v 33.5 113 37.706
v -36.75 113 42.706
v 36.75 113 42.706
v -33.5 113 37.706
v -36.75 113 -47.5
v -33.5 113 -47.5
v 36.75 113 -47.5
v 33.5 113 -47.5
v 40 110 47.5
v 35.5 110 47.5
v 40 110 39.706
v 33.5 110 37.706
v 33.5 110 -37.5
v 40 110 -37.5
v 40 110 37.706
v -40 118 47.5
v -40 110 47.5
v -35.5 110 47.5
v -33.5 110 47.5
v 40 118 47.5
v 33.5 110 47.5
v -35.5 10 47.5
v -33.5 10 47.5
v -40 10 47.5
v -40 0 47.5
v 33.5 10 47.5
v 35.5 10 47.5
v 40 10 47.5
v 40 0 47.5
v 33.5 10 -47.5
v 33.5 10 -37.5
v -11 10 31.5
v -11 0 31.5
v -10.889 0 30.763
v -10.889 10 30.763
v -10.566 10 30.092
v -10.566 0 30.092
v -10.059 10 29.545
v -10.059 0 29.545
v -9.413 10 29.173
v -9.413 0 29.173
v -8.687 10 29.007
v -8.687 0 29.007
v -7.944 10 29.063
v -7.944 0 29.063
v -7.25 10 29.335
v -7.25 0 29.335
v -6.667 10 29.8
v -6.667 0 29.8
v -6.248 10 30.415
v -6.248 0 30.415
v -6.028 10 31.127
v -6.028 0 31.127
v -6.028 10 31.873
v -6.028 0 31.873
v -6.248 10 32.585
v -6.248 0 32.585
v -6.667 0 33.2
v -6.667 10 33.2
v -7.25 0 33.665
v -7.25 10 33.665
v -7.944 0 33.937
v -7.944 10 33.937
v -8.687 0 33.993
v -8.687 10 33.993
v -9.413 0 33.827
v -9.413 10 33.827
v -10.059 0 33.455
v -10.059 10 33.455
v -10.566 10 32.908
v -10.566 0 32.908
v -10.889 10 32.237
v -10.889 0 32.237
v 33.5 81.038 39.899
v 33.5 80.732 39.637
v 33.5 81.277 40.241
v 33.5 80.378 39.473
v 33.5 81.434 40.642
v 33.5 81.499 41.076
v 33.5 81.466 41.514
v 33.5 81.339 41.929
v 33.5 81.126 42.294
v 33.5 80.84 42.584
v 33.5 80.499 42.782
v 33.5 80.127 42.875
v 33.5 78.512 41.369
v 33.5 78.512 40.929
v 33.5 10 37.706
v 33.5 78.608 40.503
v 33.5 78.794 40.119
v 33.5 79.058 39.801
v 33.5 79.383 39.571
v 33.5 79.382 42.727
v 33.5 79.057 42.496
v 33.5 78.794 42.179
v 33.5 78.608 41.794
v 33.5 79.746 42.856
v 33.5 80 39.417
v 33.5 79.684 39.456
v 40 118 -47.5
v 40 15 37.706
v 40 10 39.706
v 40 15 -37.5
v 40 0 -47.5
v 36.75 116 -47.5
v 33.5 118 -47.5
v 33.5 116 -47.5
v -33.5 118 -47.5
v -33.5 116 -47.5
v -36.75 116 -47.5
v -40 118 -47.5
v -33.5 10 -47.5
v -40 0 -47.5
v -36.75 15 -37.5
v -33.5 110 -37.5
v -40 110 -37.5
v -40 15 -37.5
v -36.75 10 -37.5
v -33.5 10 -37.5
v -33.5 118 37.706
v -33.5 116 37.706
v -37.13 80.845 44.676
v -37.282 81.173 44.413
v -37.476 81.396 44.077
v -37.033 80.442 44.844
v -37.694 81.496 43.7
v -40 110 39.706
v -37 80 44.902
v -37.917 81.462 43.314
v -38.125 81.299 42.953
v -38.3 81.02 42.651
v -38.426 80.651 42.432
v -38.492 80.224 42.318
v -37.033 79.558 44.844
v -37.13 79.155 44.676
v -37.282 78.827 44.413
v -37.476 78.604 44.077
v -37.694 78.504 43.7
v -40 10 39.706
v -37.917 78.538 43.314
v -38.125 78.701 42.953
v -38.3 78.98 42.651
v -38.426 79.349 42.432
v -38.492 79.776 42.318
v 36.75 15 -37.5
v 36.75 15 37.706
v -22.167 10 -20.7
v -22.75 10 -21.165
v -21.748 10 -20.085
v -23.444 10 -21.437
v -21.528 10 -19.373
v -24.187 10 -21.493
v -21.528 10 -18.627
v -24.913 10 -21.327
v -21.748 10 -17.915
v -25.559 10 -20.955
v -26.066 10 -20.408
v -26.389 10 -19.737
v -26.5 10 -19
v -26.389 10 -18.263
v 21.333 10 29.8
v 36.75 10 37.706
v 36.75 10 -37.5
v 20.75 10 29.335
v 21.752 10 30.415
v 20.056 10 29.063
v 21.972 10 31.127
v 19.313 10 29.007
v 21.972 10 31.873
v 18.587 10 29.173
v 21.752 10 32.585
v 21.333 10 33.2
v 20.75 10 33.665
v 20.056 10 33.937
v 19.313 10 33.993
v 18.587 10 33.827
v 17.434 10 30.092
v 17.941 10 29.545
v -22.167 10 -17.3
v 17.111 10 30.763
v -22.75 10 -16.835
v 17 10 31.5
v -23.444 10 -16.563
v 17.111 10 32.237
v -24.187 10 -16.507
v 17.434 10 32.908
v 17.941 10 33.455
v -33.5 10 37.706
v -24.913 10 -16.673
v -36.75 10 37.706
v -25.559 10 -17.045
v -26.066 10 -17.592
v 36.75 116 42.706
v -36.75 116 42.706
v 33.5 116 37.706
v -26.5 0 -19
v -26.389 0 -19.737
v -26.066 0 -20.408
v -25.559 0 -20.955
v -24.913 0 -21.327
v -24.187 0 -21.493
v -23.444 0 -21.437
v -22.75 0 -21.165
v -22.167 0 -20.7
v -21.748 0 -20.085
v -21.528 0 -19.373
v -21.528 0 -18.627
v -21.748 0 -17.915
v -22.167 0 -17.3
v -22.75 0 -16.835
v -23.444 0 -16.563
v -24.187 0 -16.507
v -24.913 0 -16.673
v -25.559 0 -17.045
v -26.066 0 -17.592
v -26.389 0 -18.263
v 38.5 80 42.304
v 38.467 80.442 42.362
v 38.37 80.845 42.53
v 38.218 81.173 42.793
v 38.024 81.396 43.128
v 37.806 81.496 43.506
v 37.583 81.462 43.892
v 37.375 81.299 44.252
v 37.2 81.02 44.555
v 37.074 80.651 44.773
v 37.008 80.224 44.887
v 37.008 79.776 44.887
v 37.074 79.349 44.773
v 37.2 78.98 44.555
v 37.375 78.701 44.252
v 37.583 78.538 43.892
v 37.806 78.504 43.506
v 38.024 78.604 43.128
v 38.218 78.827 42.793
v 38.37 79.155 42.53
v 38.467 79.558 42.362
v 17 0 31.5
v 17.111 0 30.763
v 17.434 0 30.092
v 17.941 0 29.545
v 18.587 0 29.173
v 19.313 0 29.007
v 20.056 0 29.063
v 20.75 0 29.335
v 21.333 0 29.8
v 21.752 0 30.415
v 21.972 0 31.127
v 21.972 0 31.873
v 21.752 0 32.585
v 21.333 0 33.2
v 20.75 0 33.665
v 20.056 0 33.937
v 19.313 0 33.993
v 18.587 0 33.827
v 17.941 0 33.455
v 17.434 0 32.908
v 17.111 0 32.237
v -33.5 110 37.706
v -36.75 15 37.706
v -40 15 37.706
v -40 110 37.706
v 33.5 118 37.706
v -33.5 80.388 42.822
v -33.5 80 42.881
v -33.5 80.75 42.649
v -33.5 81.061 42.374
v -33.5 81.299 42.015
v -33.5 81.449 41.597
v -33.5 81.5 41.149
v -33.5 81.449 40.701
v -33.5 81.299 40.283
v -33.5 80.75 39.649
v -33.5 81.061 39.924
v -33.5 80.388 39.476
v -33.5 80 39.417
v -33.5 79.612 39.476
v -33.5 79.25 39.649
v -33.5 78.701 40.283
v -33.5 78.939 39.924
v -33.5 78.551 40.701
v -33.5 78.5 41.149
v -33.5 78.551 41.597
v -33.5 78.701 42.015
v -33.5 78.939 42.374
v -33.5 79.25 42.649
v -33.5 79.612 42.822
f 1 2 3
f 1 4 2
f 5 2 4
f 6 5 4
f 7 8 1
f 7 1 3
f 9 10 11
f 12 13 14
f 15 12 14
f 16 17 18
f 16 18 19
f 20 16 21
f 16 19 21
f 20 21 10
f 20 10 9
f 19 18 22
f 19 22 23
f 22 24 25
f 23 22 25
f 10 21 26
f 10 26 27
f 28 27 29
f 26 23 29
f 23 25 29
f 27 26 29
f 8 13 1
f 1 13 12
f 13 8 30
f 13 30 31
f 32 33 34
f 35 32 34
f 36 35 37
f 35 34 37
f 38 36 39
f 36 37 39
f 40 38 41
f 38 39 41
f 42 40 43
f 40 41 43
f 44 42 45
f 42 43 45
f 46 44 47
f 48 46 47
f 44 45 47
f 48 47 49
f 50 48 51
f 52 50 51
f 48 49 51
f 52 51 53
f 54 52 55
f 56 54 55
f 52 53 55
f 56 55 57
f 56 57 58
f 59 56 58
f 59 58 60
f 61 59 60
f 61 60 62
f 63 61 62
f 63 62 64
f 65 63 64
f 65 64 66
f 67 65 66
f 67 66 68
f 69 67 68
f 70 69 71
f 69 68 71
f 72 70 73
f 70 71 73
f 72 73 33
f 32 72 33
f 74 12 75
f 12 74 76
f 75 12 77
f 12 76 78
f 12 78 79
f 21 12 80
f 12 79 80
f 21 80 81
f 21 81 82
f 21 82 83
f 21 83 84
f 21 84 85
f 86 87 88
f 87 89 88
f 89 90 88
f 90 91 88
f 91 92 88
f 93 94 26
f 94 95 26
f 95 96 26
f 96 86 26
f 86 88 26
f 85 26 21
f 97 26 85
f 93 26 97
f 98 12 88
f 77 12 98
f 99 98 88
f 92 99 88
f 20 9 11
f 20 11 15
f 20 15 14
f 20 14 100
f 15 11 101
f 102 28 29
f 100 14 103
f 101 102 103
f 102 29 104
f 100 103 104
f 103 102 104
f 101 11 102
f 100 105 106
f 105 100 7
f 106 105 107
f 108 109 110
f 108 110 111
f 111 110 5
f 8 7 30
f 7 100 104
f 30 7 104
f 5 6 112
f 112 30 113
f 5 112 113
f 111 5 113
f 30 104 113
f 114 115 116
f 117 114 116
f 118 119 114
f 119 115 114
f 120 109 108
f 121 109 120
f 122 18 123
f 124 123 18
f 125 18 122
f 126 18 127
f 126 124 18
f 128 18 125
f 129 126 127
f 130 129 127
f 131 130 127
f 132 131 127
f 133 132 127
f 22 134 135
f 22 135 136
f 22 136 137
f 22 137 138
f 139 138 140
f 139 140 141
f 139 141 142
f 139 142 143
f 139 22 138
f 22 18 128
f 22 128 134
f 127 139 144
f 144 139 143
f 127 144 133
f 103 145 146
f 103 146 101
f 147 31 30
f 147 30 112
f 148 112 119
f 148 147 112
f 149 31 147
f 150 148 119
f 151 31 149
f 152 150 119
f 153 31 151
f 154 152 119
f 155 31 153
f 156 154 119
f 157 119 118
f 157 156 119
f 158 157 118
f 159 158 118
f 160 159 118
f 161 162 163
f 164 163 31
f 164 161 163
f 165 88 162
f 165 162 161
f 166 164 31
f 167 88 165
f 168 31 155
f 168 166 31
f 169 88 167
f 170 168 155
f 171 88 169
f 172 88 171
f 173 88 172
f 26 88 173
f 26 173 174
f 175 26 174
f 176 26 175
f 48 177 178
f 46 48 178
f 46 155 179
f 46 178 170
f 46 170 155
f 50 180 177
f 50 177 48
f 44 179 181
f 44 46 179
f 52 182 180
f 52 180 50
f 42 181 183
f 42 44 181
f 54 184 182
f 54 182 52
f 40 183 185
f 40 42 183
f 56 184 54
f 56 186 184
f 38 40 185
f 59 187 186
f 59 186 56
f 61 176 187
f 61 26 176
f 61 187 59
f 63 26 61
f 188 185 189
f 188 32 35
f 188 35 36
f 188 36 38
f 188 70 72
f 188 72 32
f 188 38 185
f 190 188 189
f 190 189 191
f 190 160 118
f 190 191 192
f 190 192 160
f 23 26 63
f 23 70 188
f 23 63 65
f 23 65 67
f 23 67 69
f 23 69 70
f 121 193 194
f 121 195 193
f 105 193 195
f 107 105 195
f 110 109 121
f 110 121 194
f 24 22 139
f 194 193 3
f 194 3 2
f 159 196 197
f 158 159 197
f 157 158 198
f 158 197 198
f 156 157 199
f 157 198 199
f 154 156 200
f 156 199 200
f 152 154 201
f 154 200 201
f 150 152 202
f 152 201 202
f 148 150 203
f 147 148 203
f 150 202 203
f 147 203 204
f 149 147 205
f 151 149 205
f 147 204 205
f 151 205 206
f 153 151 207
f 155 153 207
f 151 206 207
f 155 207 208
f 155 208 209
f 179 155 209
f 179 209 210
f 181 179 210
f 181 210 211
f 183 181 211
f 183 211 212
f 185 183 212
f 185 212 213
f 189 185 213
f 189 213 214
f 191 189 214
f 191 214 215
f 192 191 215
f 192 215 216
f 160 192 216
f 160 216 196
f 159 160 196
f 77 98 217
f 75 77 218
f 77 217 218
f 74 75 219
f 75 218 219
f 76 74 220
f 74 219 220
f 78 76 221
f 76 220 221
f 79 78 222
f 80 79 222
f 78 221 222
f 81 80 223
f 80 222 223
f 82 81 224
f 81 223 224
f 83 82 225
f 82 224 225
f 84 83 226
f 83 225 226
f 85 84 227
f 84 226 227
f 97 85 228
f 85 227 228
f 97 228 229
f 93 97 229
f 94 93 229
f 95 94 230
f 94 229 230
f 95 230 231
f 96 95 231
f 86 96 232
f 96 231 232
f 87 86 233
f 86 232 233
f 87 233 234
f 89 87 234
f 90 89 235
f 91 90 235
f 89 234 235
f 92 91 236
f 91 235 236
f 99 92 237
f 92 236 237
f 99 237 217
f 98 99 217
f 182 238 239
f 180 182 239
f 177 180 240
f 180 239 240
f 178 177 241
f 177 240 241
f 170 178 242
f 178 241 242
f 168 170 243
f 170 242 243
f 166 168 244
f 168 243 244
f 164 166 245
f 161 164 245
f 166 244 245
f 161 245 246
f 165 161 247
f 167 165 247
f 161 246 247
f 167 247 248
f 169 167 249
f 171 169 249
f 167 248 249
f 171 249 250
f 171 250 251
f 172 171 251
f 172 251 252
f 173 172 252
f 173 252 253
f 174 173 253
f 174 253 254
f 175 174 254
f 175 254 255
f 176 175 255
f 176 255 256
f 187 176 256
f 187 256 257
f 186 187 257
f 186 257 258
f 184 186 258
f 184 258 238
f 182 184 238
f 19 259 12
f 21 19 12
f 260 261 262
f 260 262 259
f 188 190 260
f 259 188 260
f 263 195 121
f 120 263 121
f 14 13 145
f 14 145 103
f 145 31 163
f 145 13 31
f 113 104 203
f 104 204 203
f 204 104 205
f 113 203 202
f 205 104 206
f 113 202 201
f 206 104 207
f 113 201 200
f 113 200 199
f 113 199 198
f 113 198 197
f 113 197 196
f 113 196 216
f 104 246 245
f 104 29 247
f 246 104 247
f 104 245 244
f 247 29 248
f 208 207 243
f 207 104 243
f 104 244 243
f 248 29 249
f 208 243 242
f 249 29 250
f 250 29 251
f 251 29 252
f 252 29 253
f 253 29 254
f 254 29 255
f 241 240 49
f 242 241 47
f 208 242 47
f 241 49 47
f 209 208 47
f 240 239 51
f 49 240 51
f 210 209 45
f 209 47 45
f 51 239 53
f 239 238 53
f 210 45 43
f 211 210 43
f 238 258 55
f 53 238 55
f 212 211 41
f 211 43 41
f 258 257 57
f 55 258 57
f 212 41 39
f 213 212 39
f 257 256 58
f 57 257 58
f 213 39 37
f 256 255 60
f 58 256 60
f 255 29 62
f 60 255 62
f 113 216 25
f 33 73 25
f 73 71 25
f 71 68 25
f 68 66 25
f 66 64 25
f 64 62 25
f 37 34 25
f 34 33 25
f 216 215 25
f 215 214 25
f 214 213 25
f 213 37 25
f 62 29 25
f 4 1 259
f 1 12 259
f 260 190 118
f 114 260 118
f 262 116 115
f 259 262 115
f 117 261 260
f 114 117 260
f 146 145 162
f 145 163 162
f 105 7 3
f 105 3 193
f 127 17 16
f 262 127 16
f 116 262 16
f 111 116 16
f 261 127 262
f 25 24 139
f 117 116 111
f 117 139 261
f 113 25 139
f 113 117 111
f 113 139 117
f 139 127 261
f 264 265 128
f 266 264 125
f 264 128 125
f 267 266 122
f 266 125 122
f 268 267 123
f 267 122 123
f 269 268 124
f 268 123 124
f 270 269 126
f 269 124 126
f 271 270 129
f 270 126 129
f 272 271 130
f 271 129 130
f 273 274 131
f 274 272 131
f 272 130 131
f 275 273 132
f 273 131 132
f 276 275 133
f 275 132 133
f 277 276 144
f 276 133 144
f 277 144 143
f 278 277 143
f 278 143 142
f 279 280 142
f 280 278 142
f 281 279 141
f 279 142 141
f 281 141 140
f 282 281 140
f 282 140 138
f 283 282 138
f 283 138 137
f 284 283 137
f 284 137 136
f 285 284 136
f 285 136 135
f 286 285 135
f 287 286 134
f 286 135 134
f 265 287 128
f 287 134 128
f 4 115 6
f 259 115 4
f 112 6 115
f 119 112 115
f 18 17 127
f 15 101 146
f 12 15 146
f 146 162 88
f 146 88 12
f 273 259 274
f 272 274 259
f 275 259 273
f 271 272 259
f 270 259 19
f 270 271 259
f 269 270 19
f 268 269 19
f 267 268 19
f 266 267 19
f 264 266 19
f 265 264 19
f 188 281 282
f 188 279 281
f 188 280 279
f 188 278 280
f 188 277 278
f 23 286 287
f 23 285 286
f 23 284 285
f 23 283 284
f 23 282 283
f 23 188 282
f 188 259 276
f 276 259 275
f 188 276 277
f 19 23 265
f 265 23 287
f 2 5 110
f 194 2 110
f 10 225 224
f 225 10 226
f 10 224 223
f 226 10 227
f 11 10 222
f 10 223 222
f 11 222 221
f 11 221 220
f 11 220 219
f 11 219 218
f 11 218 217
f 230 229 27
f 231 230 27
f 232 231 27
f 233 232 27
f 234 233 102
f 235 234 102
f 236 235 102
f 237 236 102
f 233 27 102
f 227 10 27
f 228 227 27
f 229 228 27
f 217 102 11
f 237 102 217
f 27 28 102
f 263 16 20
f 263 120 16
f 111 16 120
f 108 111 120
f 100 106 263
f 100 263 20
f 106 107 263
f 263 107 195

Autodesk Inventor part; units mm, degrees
ref_plane "YZ Plane" through (0, 0, 0) normal (1, 0, 0) x (0, 1, 0)
ref_plane "XZ Plane" through (0, 0, 0) normal (0, 1, 0) x (-1, 0, 0)
ref_plane "XY Plane" through (0, 0, 0) normal (0, 0, 1) x (1, 0, 0)
sketch "Sketch1" plane through (0, 0, 0) normal (0, 1, 0) x (-1, 0, 0)
  line L0 (-40, -47.5) -> (40, -47.5)
  line L1 (40, -47.5) -> (40, 47.5)
  line L2 (40, 47.5) -> (-40, 47.5)
  line L3 (-40, 47.5) -> (-40, -47.5)
  line L4 (-40, -47.5) -> (40, 47.5) construction
  line L5 (40, -47.5) -> (-40, 47.5) construction
  line L6 (25.5, 17) -> (28.5, 17)
  line L7 (0, 17.5) -> (0, 19)
  line L8 (0, 0) -> (2.25, 0)
  line L9 (0, 0) -> (0, 17.5)
  line L10 (-27.5, -36.75) -> (-27.5, 38.25)
  line L11 (-27.5, 38.25) -> (28.5, -36.75) construction
  line L12 (28.5, 38.25) -> (-27.5, -36.75) construction
  line L13 (28.5, 38.25) -> (28.5, -36.75)
  line L14 (28.5, 17) -> (28.5, -36.75)
  line L15 (28.5, -36.75) -> (-27.5, -36.75)
  line L16 (0, -31.5) -> (8.5, -31.5)
  line L17 (0, 0) -> (0, -31.5)
  line L18 (0, -31.5) -> (-19.5, -31.5)
  line L19 (-19.5, -31.5) -> (-19.5, -36.75)
  line L20 (-27.5, 38.25) -> (28.5, 38.25)
  line L21 (0, 19) -> (24, 19)
  line L22 (0, 0) -> (0, 31.5)
  line L23 (28.5, -17) -> (28.5, 36.75)
  line L24 (28.5, -38.25) -> (28.5, 36.75)
  line L25 (28.5, -38.25) -> (-27.5, 36.75) construction
  line L26 (-27.5, 36.75) -> (-27.5, -38.25)
  line L27 (-27.5, -38.25) -> (28.5, 36.75) construction
  line L28 (0, 31.5) -> (8.5, 31.5)
  circle A0 centre (8.5, 31.5) radius 2.5
  line L29 (0, 31.5) -> (-19.5, 31.5)
  circle A1 centre (-19.5, 31.5) radius 2.5
  circle A2 centre (-19.5, 31.5) radius 2.5
  line L30 (-19.5, 31.5) -> (-19.5, 36.75)
  line L31 (28.5, 36.75) -> (-27.5, 36.75)
  line L32 (0, 0) -> (0, -17.5)
  line L33 (0, -17.5) -> (0, -19)
  line L34 (25.5, -17) -> (28.5, -17)
  line L35 (0, -19) -> (24, -19)
  line L36 (-27.5, -38.25) -> (28.5, -38.25)
  circle A3 centre (24, -19) radius 2.5
  point P0 (0.5, 0.75)
  point P1 (0.5, -0.75)
  dimension "d0" = 80
  dimension "d1" = 95
  dimension "d5" = 17.5
  dimension "d6" = 8.5
  dimension "d7" = 19.5
  dimension "d8" = 31.5
  dimension "d9" = 24
  dimension "d11" = 2.25
  dimension "d12" = 56
  dimension "d13" = 75
  dimension "d14" = 5.25
  dimension "d15" = 3
ref_plane "Work Plane3" through (0, 10, 0) normal (0, 1, 0) x (1, 0, 0)
sketch "Sketch2" plane through (0, 10, 0) normal (0, 1, 0) x (1, 0, 0)
  line L0 (35.5, -47.5) -> (40, -39.7058)
  line L1 (35.5, -47.5) -> (44.5, -47.5) construction
  line L2 (40, -39.7058) -> (35.5, -39.7058)
  line L3 (35.5, -39.7058) -> (35.5, -47.5)
  line L4 (-40, -47.5) -> (40, -47.5) projected
  line L5 (40, -47.5) -> (40, 47.5) projected
  line L6 (40, -37.7058) -> (33.5, -37.7058)
  line L7 (33.5, -37.7058) -> (33.5, -47.5)
  line L8 (33.5, -47.5) -> (35.5, -47.5)
  line L9 (40, -39.7058) -> (40, -37.7058)
  line L10 (0, -47.5) -> (0, 47.5)
  line L11 (-35.5, -47.5) -> (-40, -39.7058)
  line L12 (-35.5, -47.5) -> (-44.5, -47.5) construction
  line L13 (-40, -39.7058) -> (-35.5, -39.7058)
  line L14 (-35.5, -39.7058) -> (-35.5, -47.5)
  line L15 (-40, -37.7058) -> (-33.5, -37.7058)
  line L16 (-33.5, -37.7058) -> (-33.5, -47.5)
  line L17 (-33.5, -47.5) -> (-35.5, -47.5)
  line L18 (-40, -39.7058) -> (-40, -37.7058)
  line L19 (40, 47.5) -> (-40, 47.5) projected
  line L20 (-40, 47.5) -> (-33.5, 47.5)
  line L21 (-33.5, 47.5) -> (-33.5, 37.5)
  line L22 (-33.5, 37.5) -> (-40, 37.5)
  line L23 (-40, 37.5) -> (-40, 47.5)
  line L24 (40, 47.5) -> (33.5, 47.5)
  line L25 (33.5, 47.5) -> (33.5, 37.5)
  line L26 (33.5, 37.5) -> (40, 37.5)
  line L27 (40, 37.5) -> (40, 47.5)
  point P0 (0, 0)
  dimension "d18" = 9
  dimension "d19" = 60
  dimension "d20" = 2
  dimension "d21" = 9.7942
  dimension "d22" = 6.5
  dimension "d23" = 6.5
  dimension "d24" = 10
  dimension "d25" = 6.5
  dimension "d26" = 10
extrude "Extrusion2" add sketch "Sketch2" along normal blind 100 contours L3 L2 L0 | L4 L7 L6 L5 L2 L3 | L26 L25 L19 L5 | L14 L13 L18 L15 L16 L4 | L11 L13 L14 | L21 L22 L23 L19
ref_plane "Work Plane2" through (0, 10, 0) normal (0, 1, 0) x (1, 0, 0)
sketch "Sketch3" plane through (0, 10, 0) normal (0, 1, 0) x (1, 0, 0)
  line L0 (-40, 37.5) -> (-40, -37.7058) projected
  line L1 (-33.5, 37.5) -> (-40, 37.5) projected
  line L2 (-40, -37.7058) -> (-36.75, -37.7058)
  line L3 (-36.75, -37.7058) -> (-36.75, 37.5)
  line L4 (-36.75, 37.5) -> (-40, 37.5)
  line L5 (-40, 37.5) -> (-40, -37.7058)
  line L6 (33.5, 37.5) -> (40, 37.5) projected
  line L7 (40, -37.7058) -> (33.5, -37.7058) projected
  line L8 (40, 37.5) -> (36.75, 37.5)
  line L9 (36.75, 37.5) -> (36.75, -37.7058)
  line L10 (36.75, -37.7058) -> (40, -37.7058)
  line L11 (40, -37.7058) -> (40, 37.5)
  point P0 (0, 0)
extrude "Extrusion3" add sketch "Sketch3" along normal blind 5
ref_plane "Work Plane4" through (0, 110, 0) normal (0, 1, 0) x (1, 0, 0)
sketch "Sketch4" plane through (0, 110, 0) normal (0, 1, 0) x (1, 0, 0)
  line L0 (-33.5, 47.5) -> (-40, 47.5) projected
  line L1 (-40, -47.5) -> (40, -47.5) projected
  line L2 (-40, 47.5) -> (-33.5, 47.5)
  line L3 (-33.5, 47.5) -> (-33.5, -47.5)
  line L4 (-33.5, -47.5) -> (-40, -47.5)
  line L5 (-40, -47.5) -> (-40, 47.5)
  line L6 (40, 37.5) -> (40, 47.5) projected
  line L7 (40, 47.5) -> (33.5, 47.5)
  line L8 (33.5, 47.5) -> (33.5, -47.5)
  line L9 (33.5, -47.5) -> (40, -47.5)
  line L10 (40, -47.5) -> (40, 47.5)
  line L11 (40, -37.7058) -> (33.5, -37.7058) projected
  line L12 (33.5, -37.7058) -> (-33.5, -37.7058)
  line L13 (-33.5, -37.7058) -> (-33.5, -47.5)
  line L14 (-33.5, -47.5) -> (33.5, -47.5)
  line L15 (33.5, -47.5) -> (33.5, -37.7058)
  point P0 (0, 0)
extrude "Extrusion4" add sketch "Sketch4" along normal blind 8
ref_plane "Work Plane8" through (40, 0, -47.5) normal (0, 0, -1) x (-1, 0, 0)
sketch "Sketch5" plane through (40, 0, -47.5) normal (0, 0, -1) x (-1, 0, 0)
  line L0 (73.5, 110) -> (6.5, 110) projected
  line L1 (6.5, 110) -> (6.5, 113)
  line L2 (6.5, 10) -> (6.5, 118) projected
  line L3 (6.5, 113) -> (3.25, 113)
  line L4 (3.25, 113) -> (3.25, 116)
  line L5 (3.25, 116) -> (6.5, 116)
  line L6 (6.5, 116) -> (6.5, 113)
  line L7 (73.5, 10) -> (73.5, 118) projected
  line L8 (6.5, 116) -> (73.5, 116)
  line L9 (73.5, 116) -> (73.5, 113)
  line L10 (73.5, 113) -> (6.5, 113)
  line L11 (6.5, 113) -> (6.5, 116)
  line L12 (73.5, 113) -> (76.75, 113)
  line L13 (76.75, 113) -> (76.75, 116)
  line L14 (76.75, 116) -> (73.5, 116)
  line L15 (73.5, 116) -> (73.5, 113)
  point P0 (40, 0)
  dimension "d33" = 3
  dimension "d34" = 3
  dimension "d35" = 3.25
  dimension "d36" = 3.25
extrude "Extrusion5" cut sketch "Sketch5" against normal blind 90.206 contours L10 L2 L8 L7 | L7 L14 L13 L12 | L3 L4 L5 L2
ref_plane "Work Plane7" through (40, 10, 39.7058) normal (0.8660254, 0, 0.5) x (0.5, 0, -0.8660254)
sketch "Sketch6" plane through (40, 10, 39.7058) normal (0.8660254, 0, 0.5) x (0.5, 0, -0.8660254)
  line L0 (-9, 0) -> (-9, 100) projected
  line L1 (0, 0) -> (-9, 0) projected
  line L2 (-9, 100) -> (0, 100)
  line L3 (0, 100) -> (0, 0)
  line L4 (0, 0) -> (-9, 0)
  line L5 (-9, 0) -> (-9, 100)
  line L6 (0, 100) -> (0, 70)
  line L7 (0, 0) -> (0, 100) projected
  line L8 (0, 70) -> (-4.5, 70)
  circle A0 centre (-4.5, 70) radius 1.5
  point P0 (14.3862, -10)
  dimension "d39" = 30
  dimension "d40" = 3
extrude "Extrusion6" cut sketch "Sketch6" against normal blind 6 contours A0
ref_plane "Work Plane6" through (-35.5, 10, 47.5) normal (-0.8660254, 0, 0.5) x (0.5, 0, 0.8660254)
sketch "Sketch7" plane through (-35.5, 10, 47.5) normal (-0.8660254, 0, 0.5) x (0.5, 0, 0.8660254)
  line L0 (-9, 0) -> (-9, 100) projected
  line L1 (0, 0) -> (0, 100) projected
  line L2 (-9, 100) -> (0, 100)
  line L3 (0, 100) -> (0, 0)
  line L4 (0, 0) -> (-9, 0)
  line L5 (-9, 0) -> (-9, 100)
  line L6 (-9, 100) -> (-9, 70)
  line L7 (-9, 70) -> (-4.5, 70)
  circle A0 centre (-4.5, 70) radius 1.5
  point P0 (-23.3862, -10)
  dimension "d43" = 30
  dimension "d44" = 3
extrude "Extrusion7" cut sketch "Sketch7" against normal blind 6 contours A0
ref_plane "Work Plane5" through (40, 0, 47.5) normal (1, 0, 0) x (0, 0, -1)
sketch "Sketch8" plane through (40, 0, 47.5) normal (1, 0, 0) x (0, 0, -1)
  line L0 (85, 110) -> (9.7942, 110) projected
  line L1 (85, 110) -> (95, 110)
  line L2 (95, 110) -> (95, 80)
  line L3 (95, 80) -> (85, 80)
  line L4 (85, 80) -> (85, 110)
  circle A0 centre (90, 80) radius 1.5
  point P0 (47.5, 0)
  dimension "d47" = 10
  dimension "d48" = 30
  dimension "d49" = 3
extrude "Extrusion8" [suppressed]
ref_plane "Work Plane1" through (0, 0, 0) normal (0, -1, 0) x (1, 0, 0)
sketch "Sketch9" plane through (0, 0, 0) normal (0, -1, 0) x (1, 0, 0)
  line L0 (40, 47.5) -> (40, 39.7058) projected
  line L1 (40, 47.5) -> (20, 47.5)
  line L2 (20, 47.5) -> (20, -10)
  line L3 (20, -10) -> (40, -10)
  line L4 (40, -10) -> (40, 47.5)
  line L5 (-40, 47.5) -> (-35.5, 47.5) projected
  line L6 (-40, 47.5) -> (-20, 47.5)
  line L7 (-20, 47.5) -> (-20, -10)
  line L8 (-20, -10) -> (-40, -10)
  line L9 (-40, -10) -> (-40, 47.5)
  point P0 (0, 0)
  dimension "d52" = 20
  dimension "d53" = 57.5
  dimension "d54" = 20
  dimension "d55" = 57.5
extrude "Extrusion9" add sketch "Sketch1" along normal blind 10 contours L3 L2 L1 L0 | L9 L17 L18 L19 L15 L10 L31 L30 A1 L29 L22 L7 | L7 L22 L29 A1 L30 L31 L13 L34 A3 L35 L17 L9 | L35 A3 L34 L13 L15 L19 L18 L17 | L31 L10 L20 L13 | L15 L24 L36 L26
properties part number "Base"
